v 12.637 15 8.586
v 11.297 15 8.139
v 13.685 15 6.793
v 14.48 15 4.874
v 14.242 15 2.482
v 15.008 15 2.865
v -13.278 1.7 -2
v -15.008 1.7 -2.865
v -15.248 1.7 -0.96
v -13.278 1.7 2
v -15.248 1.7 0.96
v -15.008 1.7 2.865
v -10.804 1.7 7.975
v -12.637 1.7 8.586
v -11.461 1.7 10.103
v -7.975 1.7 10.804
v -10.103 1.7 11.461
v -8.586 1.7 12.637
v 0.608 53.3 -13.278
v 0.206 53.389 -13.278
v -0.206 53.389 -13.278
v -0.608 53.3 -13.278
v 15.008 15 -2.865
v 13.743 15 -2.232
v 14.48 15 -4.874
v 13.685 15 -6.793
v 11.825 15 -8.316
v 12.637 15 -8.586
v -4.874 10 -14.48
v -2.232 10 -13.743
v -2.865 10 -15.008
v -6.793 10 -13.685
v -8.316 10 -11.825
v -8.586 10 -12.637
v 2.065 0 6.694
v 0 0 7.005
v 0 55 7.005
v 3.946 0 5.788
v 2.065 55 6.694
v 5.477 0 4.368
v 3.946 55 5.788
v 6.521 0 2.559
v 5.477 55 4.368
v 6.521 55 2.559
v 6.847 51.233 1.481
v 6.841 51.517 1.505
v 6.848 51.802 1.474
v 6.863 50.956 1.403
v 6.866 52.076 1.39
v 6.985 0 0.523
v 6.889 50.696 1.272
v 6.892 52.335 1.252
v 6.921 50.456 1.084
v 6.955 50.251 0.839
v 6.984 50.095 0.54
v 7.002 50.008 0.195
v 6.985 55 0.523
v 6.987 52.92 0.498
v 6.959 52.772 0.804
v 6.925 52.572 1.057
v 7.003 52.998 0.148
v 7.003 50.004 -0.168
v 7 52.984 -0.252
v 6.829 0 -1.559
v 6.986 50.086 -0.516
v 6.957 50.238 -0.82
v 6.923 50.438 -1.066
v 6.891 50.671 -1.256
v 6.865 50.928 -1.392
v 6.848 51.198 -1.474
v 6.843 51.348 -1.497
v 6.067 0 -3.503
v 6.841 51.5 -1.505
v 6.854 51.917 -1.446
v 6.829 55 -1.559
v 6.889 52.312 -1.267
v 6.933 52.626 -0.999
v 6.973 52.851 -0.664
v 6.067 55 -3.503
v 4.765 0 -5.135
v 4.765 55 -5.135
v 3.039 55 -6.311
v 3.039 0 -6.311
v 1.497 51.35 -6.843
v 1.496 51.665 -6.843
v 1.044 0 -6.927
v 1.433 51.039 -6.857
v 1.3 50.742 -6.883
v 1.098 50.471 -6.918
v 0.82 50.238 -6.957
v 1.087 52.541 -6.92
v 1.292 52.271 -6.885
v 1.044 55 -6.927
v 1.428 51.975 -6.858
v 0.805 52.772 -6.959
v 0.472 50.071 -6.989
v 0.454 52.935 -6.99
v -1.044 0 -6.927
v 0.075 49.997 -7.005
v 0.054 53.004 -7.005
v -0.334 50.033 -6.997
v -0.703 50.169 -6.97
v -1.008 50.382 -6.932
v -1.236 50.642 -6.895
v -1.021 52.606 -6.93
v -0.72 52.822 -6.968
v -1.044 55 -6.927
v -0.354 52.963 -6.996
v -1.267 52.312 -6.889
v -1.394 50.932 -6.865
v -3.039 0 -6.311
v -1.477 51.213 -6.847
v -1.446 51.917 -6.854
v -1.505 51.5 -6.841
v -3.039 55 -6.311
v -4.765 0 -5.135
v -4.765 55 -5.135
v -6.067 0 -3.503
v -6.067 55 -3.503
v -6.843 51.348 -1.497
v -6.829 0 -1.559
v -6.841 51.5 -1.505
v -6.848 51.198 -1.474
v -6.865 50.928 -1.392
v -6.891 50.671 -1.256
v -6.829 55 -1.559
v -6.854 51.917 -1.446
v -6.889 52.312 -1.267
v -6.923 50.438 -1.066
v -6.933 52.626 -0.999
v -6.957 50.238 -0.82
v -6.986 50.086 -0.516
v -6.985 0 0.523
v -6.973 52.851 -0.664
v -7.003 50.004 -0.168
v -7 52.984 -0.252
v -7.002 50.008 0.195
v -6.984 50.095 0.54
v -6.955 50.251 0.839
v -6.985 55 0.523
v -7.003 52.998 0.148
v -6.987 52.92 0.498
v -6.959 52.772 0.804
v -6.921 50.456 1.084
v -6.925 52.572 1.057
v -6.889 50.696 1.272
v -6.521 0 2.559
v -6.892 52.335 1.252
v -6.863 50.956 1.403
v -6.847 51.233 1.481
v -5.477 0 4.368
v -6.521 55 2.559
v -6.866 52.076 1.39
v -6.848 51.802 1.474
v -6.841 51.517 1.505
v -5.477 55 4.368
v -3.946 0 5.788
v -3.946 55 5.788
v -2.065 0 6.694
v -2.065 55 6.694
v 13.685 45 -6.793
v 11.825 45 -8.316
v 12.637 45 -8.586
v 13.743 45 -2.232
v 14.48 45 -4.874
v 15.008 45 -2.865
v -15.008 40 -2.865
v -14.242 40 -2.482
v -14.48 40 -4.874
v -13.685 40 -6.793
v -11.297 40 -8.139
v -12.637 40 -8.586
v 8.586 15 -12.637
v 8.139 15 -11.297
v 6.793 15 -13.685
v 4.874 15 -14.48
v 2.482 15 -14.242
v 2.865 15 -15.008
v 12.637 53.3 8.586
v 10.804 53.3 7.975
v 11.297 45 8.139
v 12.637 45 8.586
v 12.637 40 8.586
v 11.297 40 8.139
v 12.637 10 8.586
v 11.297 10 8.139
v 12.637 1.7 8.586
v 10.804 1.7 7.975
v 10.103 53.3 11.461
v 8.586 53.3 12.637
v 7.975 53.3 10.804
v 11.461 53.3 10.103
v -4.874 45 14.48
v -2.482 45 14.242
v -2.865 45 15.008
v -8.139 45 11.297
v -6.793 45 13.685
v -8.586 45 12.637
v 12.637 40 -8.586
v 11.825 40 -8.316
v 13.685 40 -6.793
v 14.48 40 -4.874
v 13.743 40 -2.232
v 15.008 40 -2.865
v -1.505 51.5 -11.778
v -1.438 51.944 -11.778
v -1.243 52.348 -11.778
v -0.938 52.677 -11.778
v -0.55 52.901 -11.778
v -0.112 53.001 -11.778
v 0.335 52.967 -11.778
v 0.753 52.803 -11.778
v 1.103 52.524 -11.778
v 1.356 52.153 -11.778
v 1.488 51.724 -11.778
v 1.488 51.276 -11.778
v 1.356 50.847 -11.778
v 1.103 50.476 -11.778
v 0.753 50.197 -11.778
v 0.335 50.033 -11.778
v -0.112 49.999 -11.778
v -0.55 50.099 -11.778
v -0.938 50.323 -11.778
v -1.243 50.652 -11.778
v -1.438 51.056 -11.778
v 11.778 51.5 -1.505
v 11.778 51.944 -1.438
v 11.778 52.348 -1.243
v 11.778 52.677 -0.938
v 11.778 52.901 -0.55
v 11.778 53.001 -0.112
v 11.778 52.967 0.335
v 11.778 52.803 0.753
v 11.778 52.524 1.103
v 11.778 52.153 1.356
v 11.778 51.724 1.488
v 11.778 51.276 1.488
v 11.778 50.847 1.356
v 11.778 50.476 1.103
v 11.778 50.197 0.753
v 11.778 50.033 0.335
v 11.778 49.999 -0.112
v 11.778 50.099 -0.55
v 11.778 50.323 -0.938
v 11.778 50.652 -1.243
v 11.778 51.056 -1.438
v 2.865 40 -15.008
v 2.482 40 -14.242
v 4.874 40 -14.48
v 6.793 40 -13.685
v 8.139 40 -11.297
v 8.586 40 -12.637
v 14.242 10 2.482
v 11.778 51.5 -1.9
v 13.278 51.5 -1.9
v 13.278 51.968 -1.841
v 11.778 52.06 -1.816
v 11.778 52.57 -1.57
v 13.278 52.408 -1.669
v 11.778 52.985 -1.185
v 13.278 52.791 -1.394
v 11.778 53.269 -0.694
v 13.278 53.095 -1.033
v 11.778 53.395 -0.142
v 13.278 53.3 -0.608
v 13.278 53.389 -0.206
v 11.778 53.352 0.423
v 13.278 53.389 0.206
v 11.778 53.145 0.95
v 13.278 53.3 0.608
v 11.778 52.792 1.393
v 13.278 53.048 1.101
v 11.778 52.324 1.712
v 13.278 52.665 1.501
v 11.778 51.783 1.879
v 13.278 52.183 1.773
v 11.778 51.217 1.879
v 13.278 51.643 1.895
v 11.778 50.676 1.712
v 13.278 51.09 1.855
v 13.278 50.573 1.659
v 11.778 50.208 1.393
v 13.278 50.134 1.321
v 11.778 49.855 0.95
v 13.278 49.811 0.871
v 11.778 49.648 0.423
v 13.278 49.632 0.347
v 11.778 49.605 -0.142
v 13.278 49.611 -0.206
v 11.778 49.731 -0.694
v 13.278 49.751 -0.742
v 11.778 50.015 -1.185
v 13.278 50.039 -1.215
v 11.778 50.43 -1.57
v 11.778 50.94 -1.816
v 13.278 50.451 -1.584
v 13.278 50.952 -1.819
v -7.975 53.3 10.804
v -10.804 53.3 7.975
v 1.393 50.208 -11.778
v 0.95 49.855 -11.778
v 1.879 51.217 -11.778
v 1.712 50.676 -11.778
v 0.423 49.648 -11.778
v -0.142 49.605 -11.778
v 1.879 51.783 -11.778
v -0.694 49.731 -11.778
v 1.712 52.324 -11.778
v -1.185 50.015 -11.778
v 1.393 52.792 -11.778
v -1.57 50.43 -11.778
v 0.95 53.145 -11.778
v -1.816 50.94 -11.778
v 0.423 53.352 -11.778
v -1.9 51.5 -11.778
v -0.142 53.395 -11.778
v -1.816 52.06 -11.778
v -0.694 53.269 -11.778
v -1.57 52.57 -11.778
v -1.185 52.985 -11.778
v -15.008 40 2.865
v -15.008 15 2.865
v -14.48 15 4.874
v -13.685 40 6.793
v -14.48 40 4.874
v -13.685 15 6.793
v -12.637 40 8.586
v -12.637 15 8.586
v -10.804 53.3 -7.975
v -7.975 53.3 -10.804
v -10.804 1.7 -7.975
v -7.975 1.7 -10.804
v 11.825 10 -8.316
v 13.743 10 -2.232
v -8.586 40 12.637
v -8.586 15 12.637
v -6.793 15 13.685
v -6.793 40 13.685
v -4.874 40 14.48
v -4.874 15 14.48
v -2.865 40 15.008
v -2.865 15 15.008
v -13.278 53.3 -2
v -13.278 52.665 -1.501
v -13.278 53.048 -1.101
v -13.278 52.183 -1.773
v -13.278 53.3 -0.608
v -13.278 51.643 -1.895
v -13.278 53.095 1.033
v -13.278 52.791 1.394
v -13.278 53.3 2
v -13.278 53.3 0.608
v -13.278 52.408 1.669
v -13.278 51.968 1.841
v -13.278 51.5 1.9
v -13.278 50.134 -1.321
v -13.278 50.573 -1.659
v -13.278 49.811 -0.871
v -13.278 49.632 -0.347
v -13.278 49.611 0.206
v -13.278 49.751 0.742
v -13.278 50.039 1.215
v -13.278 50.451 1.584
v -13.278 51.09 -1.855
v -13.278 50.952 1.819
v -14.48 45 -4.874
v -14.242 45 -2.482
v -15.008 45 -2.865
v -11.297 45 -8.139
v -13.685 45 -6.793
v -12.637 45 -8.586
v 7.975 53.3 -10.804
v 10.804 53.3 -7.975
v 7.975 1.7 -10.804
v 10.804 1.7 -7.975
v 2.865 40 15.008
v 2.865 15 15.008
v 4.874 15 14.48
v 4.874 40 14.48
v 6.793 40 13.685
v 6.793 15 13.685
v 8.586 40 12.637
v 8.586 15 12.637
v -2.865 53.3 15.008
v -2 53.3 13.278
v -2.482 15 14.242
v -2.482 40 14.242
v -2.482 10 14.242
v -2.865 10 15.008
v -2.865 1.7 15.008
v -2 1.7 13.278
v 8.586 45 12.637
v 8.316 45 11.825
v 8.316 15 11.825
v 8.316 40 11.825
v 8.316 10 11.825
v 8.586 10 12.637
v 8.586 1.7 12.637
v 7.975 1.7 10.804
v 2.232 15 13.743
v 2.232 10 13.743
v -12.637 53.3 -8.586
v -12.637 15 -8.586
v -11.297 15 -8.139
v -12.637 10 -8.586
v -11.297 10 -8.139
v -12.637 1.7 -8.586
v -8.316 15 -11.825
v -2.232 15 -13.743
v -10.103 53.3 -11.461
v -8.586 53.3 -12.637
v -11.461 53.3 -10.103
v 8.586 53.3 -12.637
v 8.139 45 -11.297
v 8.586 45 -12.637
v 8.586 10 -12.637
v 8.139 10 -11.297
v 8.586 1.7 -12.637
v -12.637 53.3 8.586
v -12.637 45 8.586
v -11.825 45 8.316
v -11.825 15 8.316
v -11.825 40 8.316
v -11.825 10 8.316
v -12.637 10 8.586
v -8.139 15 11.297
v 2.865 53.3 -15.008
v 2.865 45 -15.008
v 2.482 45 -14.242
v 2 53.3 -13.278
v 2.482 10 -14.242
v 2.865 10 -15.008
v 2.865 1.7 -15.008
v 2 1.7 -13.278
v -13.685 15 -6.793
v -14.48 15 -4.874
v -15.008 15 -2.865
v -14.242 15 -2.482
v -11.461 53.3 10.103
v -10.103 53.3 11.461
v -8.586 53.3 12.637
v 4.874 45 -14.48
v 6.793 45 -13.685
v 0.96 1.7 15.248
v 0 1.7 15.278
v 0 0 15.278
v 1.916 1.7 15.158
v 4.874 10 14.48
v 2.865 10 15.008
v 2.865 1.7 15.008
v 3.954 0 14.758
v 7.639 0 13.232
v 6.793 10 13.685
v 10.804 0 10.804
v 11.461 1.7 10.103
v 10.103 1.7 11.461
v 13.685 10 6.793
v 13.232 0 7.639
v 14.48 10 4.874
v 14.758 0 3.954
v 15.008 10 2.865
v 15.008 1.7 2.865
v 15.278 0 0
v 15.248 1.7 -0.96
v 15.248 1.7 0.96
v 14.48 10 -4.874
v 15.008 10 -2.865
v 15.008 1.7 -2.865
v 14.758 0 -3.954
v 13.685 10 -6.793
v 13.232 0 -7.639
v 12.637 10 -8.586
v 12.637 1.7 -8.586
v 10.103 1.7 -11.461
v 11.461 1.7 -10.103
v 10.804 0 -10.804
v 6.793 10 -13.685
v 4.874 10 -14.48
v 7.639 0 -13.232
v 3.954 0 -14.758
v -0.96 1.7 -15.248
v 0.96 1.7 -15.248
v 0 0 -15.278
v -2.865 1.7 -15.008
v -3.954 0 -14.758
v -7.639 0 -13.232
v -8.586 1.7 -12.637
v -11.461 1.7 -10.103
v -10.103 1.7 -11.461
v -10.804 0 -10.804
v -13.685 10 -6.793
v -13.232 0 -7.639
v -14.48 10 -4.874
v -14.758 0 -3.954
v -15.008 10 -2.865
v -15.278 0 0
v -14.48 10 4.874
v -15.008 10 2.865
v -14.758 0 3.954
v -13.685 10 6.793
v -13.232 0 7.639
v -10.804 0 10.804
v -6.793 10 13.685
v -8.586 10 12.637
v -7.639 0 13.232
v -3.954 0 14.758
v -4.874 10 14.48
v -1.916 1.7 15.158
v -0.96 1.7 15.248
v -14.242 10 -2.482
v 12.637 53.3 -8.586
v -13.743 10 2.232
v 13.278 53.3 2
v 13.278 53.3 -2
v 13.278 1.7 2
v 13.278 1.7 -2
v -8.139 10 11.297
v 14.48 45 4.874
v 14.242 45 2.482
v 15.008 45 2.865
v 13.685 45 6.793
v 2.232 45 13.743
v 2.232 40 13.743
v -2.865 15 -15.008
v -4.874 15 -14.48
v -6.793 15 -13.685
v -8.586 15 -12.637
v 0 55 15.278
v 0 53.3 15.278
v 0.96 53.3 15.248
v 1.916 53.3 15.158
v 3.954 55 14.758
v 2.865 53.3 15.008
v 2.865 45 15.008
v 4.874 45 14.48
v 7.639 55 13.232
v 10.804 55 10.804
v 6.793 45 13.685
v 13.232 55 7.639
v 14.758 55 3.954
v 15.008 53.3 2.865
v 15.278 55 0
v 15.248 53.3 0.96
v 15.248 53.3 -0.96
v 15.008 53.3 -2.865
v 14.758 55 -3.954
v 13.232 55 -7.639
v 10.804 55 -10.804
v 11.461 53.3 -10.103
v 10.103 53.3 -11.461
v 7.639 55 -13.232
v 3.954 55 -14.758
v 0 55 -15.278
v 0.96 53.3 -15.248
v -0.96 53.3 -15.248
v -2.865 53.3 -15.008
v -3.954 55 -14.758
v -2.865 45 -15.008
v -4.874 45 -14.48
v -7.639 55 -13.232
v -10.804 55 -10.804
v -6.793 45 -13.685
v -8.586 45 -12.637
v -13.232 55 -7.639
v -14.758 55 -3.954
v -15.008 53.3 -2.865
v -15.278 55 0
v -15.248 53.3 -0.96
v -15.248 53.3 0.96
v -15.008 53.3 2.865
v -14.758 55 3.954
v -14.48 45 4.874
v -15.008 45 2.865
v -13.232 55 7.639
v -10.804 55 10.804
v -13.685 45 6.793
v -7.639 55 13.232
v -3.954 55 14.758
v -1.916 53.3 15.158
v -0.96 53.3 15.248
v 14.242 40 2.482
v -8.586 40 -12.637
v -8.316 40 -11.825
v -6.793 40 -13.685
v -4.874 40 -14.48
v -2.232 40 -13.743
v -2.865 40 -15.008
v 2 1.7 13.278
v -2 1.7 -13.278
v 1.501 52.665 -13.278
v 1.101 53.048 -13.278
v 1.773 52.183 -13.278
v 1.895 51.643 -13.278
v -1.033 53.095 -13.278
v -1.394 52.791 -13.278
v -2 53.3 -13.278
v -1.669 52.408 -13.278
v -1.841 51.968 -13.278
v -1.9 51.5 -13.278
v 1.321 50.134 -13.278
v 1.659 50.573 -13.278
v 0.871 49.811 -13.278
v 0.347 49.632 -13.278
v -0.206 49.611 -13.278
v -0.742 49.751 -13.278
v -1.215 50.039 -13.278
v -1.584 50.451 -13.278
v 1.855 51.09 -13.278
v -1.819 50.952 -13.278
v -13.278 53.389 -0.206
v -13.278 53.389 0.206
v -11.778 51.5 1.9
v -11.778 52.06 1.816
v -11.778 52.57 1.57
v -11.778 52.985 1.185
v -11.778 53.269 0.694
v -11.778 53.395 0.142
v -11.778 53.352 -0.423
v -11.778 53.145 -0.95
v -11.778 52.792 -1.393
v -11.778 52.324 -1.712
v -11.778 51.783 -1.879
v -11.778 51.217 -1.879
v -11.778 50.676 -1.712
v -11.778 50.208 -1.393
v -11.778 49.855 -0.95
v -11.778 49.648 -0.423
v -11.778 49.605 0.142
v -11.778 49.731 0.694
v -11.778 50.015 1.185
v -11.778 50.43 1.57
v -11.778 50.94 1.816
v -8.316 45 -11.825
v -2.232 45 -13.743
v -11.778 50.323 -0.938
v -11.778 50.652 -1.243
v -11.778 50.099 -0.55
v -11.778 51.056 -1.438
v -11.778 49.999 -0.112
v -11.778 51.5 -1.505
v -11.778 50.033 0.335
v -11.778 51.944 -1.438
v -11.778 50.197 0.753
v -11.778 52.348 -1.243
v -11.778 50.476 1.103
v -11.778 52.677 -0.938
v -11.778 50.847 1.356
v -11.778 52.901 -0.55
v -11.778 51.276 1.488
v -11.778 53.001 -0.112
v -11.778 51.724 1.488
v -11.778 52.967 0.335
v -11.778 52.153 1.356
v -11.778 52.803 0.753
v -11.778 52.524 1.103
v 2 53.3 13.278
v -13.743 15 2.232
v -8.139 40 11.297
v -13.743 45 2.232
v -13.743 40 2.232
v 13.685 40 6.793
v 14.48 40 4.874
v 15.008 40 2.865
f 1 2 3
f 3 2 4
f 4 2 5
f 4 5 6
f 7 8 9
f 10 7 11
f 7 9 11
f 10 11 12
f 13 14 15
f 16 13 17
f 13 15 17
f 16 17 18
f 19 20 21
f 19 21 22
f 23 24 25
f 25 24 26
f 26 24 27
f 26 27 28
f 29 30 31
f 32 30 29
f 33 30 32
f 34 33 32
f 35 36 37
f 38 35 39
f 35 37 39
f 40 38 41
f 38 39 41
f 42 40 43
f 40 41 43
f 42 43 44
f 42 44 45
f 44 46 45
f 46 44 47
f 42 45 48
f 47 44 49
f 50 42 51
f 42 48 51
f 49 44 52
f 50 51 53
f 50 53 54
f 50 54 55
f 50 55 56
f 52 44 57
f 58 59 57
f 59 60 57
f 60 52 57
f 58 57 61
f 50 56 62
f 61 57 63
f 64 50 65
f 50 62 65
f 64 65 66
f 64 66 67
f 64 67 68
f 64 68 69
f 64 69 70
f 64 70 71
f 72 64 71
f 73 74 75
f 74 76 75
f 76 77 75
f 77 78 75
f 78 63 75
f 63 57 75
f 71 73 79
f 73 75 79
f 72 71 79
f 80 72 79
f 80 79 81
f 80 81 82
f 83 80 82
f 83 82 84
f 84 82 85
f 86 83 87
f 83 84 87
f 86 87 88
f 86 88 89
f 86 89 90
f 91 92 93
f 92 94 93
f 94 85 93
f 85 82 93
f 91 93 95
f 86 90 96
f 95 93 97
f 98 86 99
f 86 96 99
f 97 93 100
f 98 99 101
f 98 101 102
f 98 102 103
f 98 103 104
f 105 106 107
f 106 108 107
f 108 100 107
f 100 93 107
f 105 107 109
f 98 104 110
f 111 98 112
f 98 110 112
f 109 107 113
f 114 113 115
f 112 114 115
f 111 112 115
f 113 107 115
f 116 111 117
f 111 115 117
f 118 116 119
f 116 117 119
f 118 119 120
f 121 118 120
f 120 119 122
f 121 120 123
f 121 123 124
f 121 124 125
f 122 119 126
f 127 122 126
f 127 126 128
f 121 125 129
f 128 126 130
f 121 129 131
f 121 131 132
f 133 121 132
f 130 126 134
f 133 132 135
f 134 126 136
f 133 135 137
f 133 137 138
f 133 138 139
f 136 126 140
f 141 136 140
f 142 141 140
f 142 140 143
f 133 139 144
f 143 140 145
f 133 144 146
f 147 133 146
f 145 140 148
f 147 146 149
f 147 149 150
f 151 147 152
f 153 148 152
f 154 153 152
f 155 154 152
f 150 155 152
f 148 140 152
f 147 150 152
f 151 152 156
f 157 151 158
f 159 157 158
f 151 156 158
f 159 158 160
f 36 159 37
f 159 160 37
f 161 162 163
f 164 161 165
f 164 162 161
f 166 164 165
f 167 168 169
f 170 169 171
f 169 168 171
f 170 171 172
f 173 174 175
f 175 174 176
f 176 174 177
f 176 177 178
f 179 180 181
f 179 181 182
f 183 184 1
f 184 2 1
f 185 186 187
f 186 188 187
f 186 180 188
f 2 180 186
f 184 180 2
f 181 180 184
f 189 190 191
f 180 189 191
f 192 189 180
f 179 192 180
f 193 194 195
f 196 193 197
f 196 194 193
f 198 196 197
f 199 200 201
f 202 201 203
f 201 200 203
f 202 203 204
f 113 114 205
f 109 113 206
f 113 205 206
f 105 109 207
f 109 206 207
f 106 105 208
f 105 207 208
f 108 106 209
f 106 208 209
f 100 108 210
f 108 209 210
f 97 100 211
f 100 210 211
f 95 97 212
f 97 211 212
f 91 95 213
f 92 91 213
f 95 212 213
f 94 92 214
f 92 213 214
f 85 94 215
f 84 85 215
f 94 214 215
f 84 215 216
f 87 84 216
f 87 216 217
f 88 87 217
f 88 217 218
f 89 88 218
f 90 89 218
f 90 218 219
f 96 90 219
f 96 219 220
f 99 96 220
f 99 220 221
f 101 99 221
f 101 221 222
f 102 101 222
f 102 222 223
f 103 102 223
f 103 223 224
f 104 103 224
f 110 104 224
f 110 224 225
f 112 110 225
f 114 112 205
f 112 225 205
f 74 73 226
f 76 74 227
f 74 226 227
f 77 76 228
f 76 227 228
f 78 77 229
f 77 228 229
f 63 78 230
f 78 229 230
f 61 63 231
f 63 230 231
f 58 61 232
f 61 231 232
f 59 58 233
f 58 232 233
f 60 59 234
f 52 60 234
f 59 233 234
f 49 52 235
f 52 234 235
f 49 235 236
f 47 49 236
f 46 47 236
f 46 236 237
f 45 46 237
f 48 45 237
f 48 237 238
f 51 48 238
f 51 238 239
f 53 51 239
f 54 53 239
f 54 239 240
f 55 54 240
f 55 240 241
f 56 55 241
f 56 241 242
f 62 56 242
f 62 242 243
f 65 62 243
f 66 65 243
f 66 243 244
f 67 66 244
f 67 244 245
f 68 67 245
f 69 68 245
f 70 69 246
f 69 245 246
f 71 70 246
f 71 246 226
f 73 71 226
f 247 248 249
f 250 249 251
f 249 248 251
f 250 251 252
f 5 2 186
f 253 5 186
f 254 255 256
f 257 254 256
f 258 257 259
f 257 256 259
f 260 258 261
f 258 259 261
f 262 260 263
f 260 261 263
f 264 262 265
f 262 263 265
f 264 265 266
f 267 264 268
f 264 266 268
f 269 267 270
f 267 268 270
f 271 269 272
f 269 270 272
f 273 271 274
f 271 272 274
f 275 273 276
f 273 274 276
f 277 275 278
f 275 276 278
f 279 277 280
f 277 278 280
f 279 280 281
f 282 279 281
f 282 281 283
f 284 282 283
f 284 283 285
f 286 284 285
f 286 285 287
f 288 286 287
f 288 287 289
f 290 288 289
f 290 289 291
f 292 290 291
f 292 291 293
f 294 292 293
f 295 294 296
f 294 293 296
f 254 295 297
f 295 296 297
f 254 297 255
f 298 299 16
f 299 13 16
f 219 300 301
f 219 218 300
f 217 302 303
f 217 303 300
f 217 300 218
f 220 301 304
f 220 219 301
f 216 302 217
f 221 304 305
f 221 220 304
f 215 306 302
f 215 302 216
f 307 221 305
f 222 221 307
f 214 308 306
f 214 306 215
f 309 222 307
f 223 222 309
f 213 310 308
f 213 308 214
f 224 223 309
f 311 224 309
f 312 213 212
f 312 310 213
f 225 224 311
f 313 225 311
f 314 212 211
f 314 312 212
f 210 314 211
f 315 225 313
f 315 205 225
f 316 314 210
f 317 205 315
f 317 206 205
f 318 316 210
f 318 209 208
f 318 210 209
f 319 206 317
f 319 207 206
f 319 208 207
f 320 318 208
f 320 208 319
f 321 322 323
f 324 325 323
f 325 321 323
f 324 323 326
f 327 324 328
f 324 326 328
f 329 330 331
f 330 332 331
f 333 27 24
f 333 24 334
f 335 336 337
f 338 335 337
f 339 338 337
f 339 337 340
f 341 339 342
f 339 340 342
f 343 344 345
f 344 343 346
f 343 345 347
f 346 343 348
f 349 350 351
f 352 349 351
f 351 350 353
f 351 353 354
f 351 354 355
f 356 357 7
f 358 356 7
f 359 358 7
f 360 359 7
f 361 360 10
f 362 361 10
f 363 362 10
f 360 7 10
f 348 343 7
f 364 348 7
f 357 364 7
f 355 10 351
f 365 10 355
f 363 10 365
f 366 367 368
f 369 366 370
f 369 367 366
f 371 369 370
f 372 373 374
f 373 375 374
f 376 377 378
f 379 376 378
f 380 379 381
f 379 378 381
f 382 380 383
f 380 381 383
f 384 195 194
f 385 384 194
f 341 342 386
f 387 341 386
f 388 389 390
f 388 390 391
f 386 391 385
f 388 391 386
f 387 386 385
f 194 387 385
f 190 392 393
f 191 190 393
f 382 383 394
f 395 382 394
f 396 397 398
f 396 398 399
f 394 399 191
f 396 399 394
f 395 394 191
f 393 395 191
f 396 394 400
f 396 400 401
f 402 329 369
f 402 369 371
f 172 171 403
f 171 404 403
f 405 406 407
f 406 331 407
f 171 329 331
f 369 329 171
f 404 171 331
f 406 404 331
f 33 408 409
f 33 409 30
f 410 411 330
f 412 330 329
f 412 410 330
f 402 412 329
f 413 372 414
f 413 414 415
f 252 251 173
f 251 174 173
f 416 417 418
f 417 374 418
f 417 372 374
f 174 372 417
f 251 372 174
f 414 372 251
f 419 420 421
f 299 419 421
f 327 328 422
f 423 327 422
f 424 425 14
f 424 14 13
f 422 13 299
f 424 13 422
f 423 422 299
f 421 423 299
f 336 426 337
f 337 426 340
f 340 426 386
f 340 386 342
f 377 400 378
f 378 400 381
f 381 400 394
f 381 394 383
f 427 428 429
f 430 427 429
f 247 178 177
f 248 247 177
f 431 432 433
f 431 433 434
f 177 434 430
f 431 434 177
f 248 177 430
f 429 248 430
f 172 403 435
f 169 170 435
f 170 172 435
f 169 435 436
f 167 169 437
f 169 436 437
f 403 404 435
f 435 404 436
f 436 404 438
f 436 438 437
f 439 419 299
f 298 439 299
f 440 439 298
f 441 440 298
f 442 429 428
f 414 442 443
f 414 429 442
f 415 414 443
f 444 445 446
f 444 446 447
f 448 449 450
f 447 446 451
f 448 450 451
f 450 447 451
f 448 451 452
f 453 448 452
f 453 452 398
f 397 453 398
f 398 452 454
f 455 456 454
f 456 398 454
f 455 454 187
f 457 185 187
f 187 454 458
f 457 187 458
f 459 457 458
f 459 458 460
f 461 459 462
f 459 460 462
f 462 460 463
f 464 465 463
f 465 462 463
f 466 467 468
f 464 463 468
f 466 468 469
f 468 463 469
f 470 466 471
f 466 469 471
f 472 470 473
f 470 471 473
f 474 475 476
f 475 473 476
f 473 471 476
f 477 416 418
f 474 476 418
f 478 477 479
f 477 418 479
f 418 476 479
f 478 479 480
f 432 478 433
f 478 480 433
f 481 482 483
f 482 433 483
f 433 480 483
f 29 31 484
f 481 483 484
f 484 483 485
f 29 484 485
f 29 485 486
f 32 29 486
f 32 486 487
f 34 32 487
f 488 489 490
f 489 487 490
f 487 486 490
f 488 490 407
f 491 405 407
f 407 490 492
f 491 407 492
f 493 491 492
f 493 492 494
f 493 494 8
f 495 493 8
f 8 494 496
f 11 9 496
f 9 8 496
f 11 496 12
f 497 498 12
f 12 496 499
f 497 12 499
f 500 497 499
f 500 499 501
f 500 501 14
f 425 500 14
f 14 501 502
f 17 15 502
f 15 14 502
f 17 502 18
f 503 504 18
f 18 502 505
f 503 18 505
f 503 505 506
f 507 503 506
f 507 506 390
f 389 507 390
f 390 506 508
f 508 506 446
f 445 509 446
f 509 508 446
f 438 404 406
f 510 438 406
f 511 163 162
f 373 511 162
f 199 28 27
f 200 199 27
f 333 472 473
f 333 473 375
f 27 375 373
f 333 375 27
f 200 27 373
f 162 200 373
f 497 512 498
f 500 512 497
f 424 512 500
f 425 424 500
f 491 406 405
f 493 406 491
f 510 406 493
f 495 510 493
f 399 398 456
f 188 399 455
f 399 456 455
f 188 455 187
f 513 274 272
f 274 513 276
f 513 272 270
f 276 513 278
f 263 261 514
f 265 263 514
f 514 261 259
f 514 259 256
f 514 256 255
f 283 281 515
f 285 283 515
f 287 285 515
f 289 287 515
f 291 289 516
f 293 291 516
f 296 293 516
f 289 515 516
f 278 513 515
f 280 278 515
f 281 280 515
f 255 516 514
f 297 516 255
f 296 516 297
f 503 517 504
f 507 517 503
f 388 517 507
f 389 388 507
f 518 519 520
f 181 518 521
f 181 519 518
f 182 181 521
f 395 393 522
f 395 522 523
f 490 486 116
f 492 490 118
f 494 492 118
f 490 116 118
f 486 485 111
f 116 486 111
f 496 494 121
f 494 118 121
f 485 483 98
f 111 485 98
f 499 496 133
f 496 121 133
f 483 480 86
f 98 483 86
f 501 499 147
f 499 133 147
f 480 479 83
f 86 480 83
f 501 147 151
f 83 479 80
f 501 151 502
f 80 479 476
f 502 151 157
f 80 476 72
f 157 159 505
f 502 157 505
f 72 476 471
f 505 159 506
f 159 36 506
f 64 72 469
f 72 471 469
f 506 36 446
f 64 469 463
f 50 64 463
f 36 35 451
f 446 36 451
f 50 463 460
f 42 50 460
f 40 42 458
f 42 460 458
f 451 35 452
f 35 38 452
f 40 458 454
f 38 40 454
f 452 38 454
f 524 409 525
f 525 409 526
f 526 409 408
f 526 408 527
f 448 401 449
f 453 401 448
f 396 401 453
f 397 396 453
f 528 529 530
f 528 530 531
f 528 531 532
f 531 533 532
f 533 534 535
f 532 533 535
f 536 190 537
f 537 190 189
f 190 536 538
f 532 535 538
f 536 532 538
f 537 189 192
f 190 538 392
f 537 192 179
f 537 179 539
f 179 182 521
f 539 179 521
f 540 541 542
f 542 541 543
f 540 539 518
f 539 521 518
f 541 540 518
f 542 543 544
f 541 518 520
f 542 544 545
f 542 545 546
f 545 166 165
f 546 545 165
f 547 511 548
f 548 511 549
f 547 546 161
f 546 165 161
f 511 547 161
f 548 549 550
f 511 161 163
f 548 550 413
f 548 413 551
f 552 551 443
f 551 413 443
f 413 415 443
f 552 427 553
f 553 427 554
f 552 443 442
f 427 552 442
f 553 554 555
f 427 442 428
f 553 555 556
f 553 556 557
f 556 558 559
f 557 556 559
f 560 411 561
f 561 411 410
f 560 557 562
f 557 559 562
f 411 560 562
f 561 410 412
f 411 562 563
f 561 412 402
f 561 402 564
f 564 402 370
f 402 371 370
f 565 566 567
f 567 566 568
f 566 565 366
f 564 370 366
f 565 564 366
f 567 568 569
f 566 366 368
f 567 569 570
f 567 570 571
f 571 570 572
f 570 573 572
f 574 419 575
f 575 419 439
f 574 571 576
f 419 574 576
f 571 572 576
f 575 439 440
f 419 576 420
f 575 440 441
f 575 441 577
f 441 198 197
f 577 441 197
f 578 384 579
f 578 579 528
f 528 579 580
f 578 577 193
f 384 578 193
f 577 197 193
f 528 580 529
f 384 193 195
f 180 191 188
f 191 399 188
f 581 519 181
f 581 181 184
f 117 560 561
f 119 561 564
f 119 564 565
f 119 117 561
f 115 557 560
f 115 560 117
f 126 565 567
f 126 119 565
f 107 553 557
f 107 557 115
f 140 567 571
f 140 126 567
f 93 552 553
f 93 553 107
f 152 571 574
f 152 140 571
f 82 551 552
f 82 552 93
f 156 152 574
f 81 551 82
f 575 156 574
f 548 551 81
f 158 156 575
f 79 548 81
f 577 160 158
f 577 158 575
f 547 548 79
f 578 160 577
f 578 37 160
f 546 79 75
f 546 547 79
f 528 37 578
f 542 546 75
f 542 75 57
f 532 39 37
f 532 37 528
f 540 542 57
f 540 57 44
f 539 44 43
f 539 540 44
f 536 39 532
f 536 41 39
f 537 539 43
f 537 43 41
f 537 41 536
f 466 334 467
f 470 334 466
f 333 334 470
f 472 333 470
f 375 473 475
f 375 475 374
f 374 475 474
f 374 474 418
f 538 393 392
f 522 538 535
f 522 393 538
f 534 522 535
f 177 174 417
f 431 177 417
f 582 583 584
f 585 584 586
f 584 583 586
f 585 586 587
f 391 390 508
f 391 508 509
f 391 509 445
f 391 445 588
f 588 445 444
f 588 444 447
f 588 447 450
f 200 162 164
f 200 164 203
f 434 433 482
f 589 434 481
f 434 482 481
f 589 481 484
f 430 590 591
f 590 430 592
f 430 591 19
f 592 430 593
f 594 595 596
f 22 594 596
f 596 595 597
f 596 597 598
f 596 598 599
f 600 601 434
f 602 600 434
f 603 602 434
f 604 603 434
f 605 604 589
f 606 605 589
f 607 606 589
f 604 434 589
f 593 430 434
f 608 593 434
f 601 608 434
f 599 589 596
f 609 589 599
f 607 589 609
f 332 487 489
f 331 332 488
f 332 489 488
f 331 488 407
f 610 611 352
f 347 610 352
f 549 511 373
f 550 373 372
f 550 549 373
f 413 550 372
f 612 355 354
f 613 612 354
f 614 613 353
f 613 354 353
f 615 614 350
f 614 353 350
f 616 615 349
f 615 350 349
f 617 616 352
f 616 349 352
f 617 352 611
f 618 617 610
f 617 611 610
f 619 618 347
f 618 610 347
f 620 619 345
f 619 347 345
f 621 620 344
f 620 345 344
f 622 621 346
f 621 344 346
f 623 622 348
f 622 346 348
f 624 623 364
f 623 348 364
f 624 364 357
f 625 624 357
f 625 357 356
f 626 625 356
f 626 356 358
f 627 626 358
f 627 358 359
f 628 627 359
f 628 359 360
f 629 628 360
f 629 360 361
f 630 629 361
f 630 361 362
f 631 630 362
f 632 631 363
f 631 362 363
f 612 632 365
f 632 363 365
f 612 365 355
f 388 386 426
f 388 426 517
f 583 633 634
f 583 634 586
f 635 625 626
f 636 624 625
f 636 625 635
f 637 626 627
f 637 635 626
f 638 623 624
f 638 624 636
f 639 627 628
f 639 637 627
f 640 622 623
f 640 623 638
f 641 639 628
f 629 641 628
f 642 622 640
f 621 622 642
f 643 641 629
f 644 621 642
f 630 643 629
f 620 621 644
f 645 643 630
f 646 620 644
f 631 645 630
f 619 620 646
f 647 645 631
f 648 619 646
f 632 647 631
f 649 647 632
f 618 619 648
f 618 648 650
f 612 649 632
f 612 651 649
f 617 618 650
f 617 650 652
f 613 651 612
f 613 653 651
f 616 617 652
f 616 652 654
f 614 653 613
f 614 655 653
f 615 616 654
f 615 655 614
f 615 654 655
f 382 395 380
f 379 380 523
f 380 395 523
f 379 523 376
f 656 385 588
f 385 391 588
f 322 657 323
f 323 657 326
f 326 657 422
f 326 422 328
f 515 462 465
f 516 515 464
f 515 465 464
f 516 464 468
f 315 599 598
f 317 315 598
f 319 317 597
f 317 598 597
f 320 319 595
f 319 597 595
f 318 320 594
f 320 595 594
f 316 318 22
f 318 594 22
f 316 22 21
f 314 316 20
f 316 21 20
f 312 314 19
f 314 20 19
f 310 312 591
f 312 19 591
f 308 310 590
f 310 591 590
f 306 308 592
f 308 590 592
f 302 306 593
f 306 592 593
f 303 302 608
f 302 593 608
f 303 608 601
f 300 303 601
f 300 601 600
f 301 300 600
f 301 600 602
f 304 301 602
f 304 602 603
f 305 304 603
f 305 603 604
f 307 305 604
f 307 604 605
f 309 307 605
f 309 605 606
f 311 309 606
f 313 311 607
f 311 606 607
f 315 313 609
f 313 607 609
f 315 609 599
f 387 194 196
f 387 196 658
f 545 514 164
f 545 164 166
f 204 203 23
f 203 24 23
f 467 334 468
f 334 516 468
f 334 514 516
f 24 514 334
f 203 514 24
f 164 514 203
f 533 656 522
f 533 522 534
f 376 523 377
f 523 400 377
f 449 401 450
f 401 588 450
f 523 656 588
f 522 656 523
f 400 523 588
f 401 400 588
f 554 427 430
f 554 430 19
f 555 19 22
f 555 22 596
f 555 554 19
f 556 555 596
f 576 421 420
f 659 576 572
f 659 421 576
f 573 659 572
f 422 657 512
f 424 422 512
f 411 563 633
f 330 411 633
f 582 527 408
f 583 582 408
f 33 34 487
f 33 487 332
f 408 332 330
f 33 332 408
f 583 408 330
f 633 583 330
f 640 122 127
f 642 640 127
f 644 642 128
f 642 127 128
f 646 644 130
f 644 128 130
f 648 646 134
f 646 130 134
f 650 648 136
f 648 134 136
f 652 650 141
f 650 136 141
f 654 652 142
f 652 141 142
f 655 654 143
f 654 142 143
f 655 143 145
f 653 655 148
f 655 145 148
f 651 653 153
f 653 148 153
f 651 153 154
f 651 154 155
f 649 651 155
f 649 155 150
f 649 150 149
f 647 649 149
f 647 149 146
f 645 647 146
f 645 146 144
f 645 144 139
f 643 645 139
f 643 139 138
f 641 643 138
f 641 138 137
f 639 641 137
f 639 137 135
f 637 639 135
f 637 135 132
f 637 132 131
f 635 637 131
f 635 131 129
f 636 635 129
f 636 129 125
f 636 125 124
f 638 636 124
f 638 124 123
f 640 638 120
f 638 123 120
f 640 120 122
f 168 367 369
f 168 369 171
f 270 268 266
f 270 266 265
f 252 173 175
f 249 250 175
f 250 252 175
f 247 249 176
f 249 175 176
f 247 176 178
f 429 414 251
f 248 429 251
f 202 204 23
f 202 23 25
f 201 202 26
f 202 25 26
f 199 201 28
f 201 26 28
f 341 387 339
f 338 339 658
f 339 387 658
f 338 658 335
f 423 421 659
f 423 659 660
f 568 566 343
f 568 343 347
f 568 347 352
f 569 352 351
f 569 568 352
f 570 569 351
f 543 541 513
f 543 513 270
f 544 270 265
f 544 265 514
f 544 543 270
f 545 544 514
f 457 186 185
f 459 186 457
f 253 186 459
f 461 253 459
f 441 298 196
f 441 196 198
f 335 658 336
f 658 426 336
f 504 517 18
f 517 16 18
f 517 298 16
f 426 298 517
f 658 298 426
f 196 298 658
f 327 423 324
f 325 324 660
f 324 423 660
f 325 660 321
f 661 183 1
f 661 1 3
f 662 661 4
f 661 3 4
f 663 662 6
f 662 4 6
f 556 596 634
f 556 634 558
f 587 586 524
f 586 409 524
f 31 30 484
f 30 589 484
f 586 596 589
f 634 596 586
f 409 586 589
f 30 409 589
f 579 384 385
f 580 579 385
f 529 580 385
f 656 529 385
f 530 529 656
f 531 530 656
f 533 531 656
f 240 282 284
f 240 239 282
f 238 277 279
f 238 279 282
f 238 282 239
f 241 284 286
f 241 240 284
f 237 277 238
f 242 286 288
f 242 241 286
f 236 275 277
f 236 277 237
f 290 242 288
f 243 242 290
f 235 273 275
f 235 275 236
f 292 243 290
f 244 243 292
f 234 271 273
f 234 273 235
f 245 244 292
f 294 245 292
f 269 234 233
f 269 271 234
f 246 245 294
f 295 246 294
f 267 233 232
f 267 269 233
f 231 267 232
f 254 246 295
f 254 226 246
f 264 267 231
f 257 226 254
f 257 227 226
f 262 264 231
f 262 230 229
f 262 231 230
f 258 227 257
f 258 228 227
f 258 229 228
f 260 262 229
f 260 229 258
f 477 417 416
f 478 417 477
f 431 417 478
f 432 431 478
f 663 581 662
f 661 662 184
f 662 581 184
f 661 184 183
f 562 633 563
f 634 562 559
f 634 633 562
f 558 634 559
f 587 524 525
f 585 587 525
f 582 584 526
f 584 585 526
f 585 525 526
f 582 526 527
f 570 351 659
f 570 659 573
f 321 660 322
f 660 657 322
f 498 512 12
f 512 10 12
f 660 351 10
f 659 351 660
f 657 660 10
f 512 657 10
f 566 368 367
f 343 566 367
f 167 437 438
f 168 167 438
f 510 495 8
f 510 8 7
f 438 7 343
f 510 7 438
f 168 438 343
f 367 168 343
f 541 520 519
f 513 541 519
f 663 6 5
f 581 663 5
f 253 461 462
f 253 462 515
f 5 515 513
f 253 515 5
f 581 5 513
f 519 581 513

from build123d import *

# Parameters (mm, degrees)
SKETCH1_R           = 15.2785
BOSS_EXTRUDE1_DEPTH = 55
CUT_EXTRUDE2_DEPTH  = 25.8
CIRPATTERN1_COUNT   = 8
SKETCH5_R           = 7.005
CUT_EXTRUDE3_DEPTH  = 60.092005589
SKETCH7_W           = 5
SKETCH7_H           = 1.5
CUT_EXTRUDE4_DEPTH  = 60.092005589
CIRPATTERN2_COUNT   = 8
SKETCH8_R           = 1.9
CUT_EXTRUDE5_DEPTH  = 1.5
CIRPATTERN3_COUNT   = 2
SKETCH9_R           = 1.9
CUT_EXTRUDE6_DEPTH  = 1.5
SKETCH10_R          = 1.505
CUT_EXTRUDE7_DEPTH  = 64.17051378
SKETCH11_R          = 1.505
CUT_EXTRUDE8_DEPTH  = 8


with BuildPart() as part:
    # Sketch1 → Boss-Extrude1 (new body)
    with BuildSketch(Plane(origin=(0, 0, 0), x_dir=(1, 0, 0), z_dir=(0, 1, 0))):
        with Locations(Location((0, 0, 0), (0, 0, 270))):
            Circle(SKETCH1_R)
        with BuildLine():
            Line((1.91637679, 2.5), (-1.91637679, 2.5))
            ThreePointArc((-1.91637679, 2.5), (0, -3.15), (1.91637679, 2.5))
        make_face(mode=Mode.SUBTRACT)
    extrude(amount=BOSS_EXTRUDE1_DEPTH)

    # Sketch3 → Cut-Extrude2 (cut, symmetric)
    with BuildSketch(Plane(origin=(0, 27.5, 0), x_dir=(-1, 0, 0), z_dir=(0, -1, 0))):
        Polygon((-2, 13.2785), (2, 13.2785), (3, 15.2785), (-3, 15.2785), align=None)
    cut_extrude2 = extrude(amount=CUT_EXTRUDE2_DEPTH, both=True, mode=Mode.SUBTRACT)

    # CirPattern1: Cut-Extrude2 ×8 about axis
    cirpattern1_axis = Axis((0, 0, 0), (0, 1, 0))
    for i in range(1, CIRPATTERN1_COUNT):
        add(cut_extrude2.rotate(cirpattern1_axis, i * 360 / CIRPATTERN1_COUNT), mode=Mode.SUBTRACT)

    # Sketch5 → Cut-Extrude3 (cut, through all)
    with BuildSketch(Plane(origin=(0, 55, 0), x_dir=(1, 0, 0), z_dir=(0, 1, 0))):
        with Locations(Location((0, 0, 0), (0, 0, 270))):
            Circle(SKETCH5_R)
    extrude(amount=-CUT_EXTRUDE3_DEPTH, mode=Mode.SUBTRACT)

    # Sketch7 → Cut-Extrude4 (cut, symmetric)
    with BuildSketch(Plane(origin=(0, 0, 0), x_dir=(0, -1, 0), z_dir=(0.8870108331782212, 0, 0.46174861323503485))):
        with Locations((-12.5, 14.5285)):
            Rectangle(SKETCH7_W, SKETCH7_H)
        with Locations((-42.5, 14.5285)):
            Rectangle(SKETCH7_W, SKETCH7_H)
    cut_extrude4 = extrude(amount=CUT_EXTRUDE4_DEPTH, both=True, mode=Mode.SUBTRACT)

    # CirPattern2: Cut-Extrude4 ×8 about axis
    cirpattern2_axis = Axis((0, 0, 0), (0, 1, 0))
    for i in range(1, CIRPATTERN2_COUNT):
        add(cut_extrude4.rotate(cirpattern2_axis, i * 360 / CIRPATTERN2_COUNT), mode=Mode.SUBTRACT)

    # Sketch8 → Cut-Extrude5 (cut)
    with BuildSketch(Plane(origin=(13.2785, 0, 0), x_dir=(0, 0, -1), z_dir=(1, 0, 0))):
        with Locations((0, 51.5)):
            Circle(SKETCH8_R)
    cut_extrude5 = extrude(amount=-CUT_EXTRUDE5_DEPTH, mode=Mode.SUBTRACT)

    # CirPattern3: Cut-Extrude5 ×2 about axis
    cirpattern3_axis = Axis((0, 119.409259796, 0), (0, -1, 0))
    for i in range(1, CIRPATTERN3_COUNT):
        add(cut_extrude5.rotate(cirpattern3_axis, i * 360 / CIRPATTERN3_COUNT), mode=Mode.SUBTRACT)

    # Sketch9 → Cut-Extrude6 (cut)
    with BuildSketch(Plane(origin=(0, 0, -13.2785), x_dir=(-1, 0, 0), z_dir=(0, 0, -1))):
        with Locations((0, 51.5)):
            Circle(SKETCH9_R)
    extrude(amount=-CUT_EXTRUDE6_DEPTH, mode=Mode.SUBTRACT)

    # Sketch10 → Cut-Extrude7 (cut, through all)
    with BuildSketch(Plane(origin=(11.7785, 0, 0), x_dir=(0, 0, -1), z_dir=(1, 0, 0))):
        with Locations((0, 51.5)):
            Circle(SKETCH10_R)
    extrude(amount=-CUT_EXTRUDE7_DEPTH, mode=Mode.SUBTRACT)

    # Sketch11 → Cut-Extrude8 (cut)
    with BuildSketch(Plane(origin=(0, 0, -11.7785), x_dir=(-1, 0, 0), z_dir=(0, 0, -1))):
        with Locations((0, 51.5)):
            Circle(SKETCH11_R)
    extrude(amount=-CUT_EXTRUDE8_DEPTH, mode=Mode.SUBTRACT)


solid = part.part
